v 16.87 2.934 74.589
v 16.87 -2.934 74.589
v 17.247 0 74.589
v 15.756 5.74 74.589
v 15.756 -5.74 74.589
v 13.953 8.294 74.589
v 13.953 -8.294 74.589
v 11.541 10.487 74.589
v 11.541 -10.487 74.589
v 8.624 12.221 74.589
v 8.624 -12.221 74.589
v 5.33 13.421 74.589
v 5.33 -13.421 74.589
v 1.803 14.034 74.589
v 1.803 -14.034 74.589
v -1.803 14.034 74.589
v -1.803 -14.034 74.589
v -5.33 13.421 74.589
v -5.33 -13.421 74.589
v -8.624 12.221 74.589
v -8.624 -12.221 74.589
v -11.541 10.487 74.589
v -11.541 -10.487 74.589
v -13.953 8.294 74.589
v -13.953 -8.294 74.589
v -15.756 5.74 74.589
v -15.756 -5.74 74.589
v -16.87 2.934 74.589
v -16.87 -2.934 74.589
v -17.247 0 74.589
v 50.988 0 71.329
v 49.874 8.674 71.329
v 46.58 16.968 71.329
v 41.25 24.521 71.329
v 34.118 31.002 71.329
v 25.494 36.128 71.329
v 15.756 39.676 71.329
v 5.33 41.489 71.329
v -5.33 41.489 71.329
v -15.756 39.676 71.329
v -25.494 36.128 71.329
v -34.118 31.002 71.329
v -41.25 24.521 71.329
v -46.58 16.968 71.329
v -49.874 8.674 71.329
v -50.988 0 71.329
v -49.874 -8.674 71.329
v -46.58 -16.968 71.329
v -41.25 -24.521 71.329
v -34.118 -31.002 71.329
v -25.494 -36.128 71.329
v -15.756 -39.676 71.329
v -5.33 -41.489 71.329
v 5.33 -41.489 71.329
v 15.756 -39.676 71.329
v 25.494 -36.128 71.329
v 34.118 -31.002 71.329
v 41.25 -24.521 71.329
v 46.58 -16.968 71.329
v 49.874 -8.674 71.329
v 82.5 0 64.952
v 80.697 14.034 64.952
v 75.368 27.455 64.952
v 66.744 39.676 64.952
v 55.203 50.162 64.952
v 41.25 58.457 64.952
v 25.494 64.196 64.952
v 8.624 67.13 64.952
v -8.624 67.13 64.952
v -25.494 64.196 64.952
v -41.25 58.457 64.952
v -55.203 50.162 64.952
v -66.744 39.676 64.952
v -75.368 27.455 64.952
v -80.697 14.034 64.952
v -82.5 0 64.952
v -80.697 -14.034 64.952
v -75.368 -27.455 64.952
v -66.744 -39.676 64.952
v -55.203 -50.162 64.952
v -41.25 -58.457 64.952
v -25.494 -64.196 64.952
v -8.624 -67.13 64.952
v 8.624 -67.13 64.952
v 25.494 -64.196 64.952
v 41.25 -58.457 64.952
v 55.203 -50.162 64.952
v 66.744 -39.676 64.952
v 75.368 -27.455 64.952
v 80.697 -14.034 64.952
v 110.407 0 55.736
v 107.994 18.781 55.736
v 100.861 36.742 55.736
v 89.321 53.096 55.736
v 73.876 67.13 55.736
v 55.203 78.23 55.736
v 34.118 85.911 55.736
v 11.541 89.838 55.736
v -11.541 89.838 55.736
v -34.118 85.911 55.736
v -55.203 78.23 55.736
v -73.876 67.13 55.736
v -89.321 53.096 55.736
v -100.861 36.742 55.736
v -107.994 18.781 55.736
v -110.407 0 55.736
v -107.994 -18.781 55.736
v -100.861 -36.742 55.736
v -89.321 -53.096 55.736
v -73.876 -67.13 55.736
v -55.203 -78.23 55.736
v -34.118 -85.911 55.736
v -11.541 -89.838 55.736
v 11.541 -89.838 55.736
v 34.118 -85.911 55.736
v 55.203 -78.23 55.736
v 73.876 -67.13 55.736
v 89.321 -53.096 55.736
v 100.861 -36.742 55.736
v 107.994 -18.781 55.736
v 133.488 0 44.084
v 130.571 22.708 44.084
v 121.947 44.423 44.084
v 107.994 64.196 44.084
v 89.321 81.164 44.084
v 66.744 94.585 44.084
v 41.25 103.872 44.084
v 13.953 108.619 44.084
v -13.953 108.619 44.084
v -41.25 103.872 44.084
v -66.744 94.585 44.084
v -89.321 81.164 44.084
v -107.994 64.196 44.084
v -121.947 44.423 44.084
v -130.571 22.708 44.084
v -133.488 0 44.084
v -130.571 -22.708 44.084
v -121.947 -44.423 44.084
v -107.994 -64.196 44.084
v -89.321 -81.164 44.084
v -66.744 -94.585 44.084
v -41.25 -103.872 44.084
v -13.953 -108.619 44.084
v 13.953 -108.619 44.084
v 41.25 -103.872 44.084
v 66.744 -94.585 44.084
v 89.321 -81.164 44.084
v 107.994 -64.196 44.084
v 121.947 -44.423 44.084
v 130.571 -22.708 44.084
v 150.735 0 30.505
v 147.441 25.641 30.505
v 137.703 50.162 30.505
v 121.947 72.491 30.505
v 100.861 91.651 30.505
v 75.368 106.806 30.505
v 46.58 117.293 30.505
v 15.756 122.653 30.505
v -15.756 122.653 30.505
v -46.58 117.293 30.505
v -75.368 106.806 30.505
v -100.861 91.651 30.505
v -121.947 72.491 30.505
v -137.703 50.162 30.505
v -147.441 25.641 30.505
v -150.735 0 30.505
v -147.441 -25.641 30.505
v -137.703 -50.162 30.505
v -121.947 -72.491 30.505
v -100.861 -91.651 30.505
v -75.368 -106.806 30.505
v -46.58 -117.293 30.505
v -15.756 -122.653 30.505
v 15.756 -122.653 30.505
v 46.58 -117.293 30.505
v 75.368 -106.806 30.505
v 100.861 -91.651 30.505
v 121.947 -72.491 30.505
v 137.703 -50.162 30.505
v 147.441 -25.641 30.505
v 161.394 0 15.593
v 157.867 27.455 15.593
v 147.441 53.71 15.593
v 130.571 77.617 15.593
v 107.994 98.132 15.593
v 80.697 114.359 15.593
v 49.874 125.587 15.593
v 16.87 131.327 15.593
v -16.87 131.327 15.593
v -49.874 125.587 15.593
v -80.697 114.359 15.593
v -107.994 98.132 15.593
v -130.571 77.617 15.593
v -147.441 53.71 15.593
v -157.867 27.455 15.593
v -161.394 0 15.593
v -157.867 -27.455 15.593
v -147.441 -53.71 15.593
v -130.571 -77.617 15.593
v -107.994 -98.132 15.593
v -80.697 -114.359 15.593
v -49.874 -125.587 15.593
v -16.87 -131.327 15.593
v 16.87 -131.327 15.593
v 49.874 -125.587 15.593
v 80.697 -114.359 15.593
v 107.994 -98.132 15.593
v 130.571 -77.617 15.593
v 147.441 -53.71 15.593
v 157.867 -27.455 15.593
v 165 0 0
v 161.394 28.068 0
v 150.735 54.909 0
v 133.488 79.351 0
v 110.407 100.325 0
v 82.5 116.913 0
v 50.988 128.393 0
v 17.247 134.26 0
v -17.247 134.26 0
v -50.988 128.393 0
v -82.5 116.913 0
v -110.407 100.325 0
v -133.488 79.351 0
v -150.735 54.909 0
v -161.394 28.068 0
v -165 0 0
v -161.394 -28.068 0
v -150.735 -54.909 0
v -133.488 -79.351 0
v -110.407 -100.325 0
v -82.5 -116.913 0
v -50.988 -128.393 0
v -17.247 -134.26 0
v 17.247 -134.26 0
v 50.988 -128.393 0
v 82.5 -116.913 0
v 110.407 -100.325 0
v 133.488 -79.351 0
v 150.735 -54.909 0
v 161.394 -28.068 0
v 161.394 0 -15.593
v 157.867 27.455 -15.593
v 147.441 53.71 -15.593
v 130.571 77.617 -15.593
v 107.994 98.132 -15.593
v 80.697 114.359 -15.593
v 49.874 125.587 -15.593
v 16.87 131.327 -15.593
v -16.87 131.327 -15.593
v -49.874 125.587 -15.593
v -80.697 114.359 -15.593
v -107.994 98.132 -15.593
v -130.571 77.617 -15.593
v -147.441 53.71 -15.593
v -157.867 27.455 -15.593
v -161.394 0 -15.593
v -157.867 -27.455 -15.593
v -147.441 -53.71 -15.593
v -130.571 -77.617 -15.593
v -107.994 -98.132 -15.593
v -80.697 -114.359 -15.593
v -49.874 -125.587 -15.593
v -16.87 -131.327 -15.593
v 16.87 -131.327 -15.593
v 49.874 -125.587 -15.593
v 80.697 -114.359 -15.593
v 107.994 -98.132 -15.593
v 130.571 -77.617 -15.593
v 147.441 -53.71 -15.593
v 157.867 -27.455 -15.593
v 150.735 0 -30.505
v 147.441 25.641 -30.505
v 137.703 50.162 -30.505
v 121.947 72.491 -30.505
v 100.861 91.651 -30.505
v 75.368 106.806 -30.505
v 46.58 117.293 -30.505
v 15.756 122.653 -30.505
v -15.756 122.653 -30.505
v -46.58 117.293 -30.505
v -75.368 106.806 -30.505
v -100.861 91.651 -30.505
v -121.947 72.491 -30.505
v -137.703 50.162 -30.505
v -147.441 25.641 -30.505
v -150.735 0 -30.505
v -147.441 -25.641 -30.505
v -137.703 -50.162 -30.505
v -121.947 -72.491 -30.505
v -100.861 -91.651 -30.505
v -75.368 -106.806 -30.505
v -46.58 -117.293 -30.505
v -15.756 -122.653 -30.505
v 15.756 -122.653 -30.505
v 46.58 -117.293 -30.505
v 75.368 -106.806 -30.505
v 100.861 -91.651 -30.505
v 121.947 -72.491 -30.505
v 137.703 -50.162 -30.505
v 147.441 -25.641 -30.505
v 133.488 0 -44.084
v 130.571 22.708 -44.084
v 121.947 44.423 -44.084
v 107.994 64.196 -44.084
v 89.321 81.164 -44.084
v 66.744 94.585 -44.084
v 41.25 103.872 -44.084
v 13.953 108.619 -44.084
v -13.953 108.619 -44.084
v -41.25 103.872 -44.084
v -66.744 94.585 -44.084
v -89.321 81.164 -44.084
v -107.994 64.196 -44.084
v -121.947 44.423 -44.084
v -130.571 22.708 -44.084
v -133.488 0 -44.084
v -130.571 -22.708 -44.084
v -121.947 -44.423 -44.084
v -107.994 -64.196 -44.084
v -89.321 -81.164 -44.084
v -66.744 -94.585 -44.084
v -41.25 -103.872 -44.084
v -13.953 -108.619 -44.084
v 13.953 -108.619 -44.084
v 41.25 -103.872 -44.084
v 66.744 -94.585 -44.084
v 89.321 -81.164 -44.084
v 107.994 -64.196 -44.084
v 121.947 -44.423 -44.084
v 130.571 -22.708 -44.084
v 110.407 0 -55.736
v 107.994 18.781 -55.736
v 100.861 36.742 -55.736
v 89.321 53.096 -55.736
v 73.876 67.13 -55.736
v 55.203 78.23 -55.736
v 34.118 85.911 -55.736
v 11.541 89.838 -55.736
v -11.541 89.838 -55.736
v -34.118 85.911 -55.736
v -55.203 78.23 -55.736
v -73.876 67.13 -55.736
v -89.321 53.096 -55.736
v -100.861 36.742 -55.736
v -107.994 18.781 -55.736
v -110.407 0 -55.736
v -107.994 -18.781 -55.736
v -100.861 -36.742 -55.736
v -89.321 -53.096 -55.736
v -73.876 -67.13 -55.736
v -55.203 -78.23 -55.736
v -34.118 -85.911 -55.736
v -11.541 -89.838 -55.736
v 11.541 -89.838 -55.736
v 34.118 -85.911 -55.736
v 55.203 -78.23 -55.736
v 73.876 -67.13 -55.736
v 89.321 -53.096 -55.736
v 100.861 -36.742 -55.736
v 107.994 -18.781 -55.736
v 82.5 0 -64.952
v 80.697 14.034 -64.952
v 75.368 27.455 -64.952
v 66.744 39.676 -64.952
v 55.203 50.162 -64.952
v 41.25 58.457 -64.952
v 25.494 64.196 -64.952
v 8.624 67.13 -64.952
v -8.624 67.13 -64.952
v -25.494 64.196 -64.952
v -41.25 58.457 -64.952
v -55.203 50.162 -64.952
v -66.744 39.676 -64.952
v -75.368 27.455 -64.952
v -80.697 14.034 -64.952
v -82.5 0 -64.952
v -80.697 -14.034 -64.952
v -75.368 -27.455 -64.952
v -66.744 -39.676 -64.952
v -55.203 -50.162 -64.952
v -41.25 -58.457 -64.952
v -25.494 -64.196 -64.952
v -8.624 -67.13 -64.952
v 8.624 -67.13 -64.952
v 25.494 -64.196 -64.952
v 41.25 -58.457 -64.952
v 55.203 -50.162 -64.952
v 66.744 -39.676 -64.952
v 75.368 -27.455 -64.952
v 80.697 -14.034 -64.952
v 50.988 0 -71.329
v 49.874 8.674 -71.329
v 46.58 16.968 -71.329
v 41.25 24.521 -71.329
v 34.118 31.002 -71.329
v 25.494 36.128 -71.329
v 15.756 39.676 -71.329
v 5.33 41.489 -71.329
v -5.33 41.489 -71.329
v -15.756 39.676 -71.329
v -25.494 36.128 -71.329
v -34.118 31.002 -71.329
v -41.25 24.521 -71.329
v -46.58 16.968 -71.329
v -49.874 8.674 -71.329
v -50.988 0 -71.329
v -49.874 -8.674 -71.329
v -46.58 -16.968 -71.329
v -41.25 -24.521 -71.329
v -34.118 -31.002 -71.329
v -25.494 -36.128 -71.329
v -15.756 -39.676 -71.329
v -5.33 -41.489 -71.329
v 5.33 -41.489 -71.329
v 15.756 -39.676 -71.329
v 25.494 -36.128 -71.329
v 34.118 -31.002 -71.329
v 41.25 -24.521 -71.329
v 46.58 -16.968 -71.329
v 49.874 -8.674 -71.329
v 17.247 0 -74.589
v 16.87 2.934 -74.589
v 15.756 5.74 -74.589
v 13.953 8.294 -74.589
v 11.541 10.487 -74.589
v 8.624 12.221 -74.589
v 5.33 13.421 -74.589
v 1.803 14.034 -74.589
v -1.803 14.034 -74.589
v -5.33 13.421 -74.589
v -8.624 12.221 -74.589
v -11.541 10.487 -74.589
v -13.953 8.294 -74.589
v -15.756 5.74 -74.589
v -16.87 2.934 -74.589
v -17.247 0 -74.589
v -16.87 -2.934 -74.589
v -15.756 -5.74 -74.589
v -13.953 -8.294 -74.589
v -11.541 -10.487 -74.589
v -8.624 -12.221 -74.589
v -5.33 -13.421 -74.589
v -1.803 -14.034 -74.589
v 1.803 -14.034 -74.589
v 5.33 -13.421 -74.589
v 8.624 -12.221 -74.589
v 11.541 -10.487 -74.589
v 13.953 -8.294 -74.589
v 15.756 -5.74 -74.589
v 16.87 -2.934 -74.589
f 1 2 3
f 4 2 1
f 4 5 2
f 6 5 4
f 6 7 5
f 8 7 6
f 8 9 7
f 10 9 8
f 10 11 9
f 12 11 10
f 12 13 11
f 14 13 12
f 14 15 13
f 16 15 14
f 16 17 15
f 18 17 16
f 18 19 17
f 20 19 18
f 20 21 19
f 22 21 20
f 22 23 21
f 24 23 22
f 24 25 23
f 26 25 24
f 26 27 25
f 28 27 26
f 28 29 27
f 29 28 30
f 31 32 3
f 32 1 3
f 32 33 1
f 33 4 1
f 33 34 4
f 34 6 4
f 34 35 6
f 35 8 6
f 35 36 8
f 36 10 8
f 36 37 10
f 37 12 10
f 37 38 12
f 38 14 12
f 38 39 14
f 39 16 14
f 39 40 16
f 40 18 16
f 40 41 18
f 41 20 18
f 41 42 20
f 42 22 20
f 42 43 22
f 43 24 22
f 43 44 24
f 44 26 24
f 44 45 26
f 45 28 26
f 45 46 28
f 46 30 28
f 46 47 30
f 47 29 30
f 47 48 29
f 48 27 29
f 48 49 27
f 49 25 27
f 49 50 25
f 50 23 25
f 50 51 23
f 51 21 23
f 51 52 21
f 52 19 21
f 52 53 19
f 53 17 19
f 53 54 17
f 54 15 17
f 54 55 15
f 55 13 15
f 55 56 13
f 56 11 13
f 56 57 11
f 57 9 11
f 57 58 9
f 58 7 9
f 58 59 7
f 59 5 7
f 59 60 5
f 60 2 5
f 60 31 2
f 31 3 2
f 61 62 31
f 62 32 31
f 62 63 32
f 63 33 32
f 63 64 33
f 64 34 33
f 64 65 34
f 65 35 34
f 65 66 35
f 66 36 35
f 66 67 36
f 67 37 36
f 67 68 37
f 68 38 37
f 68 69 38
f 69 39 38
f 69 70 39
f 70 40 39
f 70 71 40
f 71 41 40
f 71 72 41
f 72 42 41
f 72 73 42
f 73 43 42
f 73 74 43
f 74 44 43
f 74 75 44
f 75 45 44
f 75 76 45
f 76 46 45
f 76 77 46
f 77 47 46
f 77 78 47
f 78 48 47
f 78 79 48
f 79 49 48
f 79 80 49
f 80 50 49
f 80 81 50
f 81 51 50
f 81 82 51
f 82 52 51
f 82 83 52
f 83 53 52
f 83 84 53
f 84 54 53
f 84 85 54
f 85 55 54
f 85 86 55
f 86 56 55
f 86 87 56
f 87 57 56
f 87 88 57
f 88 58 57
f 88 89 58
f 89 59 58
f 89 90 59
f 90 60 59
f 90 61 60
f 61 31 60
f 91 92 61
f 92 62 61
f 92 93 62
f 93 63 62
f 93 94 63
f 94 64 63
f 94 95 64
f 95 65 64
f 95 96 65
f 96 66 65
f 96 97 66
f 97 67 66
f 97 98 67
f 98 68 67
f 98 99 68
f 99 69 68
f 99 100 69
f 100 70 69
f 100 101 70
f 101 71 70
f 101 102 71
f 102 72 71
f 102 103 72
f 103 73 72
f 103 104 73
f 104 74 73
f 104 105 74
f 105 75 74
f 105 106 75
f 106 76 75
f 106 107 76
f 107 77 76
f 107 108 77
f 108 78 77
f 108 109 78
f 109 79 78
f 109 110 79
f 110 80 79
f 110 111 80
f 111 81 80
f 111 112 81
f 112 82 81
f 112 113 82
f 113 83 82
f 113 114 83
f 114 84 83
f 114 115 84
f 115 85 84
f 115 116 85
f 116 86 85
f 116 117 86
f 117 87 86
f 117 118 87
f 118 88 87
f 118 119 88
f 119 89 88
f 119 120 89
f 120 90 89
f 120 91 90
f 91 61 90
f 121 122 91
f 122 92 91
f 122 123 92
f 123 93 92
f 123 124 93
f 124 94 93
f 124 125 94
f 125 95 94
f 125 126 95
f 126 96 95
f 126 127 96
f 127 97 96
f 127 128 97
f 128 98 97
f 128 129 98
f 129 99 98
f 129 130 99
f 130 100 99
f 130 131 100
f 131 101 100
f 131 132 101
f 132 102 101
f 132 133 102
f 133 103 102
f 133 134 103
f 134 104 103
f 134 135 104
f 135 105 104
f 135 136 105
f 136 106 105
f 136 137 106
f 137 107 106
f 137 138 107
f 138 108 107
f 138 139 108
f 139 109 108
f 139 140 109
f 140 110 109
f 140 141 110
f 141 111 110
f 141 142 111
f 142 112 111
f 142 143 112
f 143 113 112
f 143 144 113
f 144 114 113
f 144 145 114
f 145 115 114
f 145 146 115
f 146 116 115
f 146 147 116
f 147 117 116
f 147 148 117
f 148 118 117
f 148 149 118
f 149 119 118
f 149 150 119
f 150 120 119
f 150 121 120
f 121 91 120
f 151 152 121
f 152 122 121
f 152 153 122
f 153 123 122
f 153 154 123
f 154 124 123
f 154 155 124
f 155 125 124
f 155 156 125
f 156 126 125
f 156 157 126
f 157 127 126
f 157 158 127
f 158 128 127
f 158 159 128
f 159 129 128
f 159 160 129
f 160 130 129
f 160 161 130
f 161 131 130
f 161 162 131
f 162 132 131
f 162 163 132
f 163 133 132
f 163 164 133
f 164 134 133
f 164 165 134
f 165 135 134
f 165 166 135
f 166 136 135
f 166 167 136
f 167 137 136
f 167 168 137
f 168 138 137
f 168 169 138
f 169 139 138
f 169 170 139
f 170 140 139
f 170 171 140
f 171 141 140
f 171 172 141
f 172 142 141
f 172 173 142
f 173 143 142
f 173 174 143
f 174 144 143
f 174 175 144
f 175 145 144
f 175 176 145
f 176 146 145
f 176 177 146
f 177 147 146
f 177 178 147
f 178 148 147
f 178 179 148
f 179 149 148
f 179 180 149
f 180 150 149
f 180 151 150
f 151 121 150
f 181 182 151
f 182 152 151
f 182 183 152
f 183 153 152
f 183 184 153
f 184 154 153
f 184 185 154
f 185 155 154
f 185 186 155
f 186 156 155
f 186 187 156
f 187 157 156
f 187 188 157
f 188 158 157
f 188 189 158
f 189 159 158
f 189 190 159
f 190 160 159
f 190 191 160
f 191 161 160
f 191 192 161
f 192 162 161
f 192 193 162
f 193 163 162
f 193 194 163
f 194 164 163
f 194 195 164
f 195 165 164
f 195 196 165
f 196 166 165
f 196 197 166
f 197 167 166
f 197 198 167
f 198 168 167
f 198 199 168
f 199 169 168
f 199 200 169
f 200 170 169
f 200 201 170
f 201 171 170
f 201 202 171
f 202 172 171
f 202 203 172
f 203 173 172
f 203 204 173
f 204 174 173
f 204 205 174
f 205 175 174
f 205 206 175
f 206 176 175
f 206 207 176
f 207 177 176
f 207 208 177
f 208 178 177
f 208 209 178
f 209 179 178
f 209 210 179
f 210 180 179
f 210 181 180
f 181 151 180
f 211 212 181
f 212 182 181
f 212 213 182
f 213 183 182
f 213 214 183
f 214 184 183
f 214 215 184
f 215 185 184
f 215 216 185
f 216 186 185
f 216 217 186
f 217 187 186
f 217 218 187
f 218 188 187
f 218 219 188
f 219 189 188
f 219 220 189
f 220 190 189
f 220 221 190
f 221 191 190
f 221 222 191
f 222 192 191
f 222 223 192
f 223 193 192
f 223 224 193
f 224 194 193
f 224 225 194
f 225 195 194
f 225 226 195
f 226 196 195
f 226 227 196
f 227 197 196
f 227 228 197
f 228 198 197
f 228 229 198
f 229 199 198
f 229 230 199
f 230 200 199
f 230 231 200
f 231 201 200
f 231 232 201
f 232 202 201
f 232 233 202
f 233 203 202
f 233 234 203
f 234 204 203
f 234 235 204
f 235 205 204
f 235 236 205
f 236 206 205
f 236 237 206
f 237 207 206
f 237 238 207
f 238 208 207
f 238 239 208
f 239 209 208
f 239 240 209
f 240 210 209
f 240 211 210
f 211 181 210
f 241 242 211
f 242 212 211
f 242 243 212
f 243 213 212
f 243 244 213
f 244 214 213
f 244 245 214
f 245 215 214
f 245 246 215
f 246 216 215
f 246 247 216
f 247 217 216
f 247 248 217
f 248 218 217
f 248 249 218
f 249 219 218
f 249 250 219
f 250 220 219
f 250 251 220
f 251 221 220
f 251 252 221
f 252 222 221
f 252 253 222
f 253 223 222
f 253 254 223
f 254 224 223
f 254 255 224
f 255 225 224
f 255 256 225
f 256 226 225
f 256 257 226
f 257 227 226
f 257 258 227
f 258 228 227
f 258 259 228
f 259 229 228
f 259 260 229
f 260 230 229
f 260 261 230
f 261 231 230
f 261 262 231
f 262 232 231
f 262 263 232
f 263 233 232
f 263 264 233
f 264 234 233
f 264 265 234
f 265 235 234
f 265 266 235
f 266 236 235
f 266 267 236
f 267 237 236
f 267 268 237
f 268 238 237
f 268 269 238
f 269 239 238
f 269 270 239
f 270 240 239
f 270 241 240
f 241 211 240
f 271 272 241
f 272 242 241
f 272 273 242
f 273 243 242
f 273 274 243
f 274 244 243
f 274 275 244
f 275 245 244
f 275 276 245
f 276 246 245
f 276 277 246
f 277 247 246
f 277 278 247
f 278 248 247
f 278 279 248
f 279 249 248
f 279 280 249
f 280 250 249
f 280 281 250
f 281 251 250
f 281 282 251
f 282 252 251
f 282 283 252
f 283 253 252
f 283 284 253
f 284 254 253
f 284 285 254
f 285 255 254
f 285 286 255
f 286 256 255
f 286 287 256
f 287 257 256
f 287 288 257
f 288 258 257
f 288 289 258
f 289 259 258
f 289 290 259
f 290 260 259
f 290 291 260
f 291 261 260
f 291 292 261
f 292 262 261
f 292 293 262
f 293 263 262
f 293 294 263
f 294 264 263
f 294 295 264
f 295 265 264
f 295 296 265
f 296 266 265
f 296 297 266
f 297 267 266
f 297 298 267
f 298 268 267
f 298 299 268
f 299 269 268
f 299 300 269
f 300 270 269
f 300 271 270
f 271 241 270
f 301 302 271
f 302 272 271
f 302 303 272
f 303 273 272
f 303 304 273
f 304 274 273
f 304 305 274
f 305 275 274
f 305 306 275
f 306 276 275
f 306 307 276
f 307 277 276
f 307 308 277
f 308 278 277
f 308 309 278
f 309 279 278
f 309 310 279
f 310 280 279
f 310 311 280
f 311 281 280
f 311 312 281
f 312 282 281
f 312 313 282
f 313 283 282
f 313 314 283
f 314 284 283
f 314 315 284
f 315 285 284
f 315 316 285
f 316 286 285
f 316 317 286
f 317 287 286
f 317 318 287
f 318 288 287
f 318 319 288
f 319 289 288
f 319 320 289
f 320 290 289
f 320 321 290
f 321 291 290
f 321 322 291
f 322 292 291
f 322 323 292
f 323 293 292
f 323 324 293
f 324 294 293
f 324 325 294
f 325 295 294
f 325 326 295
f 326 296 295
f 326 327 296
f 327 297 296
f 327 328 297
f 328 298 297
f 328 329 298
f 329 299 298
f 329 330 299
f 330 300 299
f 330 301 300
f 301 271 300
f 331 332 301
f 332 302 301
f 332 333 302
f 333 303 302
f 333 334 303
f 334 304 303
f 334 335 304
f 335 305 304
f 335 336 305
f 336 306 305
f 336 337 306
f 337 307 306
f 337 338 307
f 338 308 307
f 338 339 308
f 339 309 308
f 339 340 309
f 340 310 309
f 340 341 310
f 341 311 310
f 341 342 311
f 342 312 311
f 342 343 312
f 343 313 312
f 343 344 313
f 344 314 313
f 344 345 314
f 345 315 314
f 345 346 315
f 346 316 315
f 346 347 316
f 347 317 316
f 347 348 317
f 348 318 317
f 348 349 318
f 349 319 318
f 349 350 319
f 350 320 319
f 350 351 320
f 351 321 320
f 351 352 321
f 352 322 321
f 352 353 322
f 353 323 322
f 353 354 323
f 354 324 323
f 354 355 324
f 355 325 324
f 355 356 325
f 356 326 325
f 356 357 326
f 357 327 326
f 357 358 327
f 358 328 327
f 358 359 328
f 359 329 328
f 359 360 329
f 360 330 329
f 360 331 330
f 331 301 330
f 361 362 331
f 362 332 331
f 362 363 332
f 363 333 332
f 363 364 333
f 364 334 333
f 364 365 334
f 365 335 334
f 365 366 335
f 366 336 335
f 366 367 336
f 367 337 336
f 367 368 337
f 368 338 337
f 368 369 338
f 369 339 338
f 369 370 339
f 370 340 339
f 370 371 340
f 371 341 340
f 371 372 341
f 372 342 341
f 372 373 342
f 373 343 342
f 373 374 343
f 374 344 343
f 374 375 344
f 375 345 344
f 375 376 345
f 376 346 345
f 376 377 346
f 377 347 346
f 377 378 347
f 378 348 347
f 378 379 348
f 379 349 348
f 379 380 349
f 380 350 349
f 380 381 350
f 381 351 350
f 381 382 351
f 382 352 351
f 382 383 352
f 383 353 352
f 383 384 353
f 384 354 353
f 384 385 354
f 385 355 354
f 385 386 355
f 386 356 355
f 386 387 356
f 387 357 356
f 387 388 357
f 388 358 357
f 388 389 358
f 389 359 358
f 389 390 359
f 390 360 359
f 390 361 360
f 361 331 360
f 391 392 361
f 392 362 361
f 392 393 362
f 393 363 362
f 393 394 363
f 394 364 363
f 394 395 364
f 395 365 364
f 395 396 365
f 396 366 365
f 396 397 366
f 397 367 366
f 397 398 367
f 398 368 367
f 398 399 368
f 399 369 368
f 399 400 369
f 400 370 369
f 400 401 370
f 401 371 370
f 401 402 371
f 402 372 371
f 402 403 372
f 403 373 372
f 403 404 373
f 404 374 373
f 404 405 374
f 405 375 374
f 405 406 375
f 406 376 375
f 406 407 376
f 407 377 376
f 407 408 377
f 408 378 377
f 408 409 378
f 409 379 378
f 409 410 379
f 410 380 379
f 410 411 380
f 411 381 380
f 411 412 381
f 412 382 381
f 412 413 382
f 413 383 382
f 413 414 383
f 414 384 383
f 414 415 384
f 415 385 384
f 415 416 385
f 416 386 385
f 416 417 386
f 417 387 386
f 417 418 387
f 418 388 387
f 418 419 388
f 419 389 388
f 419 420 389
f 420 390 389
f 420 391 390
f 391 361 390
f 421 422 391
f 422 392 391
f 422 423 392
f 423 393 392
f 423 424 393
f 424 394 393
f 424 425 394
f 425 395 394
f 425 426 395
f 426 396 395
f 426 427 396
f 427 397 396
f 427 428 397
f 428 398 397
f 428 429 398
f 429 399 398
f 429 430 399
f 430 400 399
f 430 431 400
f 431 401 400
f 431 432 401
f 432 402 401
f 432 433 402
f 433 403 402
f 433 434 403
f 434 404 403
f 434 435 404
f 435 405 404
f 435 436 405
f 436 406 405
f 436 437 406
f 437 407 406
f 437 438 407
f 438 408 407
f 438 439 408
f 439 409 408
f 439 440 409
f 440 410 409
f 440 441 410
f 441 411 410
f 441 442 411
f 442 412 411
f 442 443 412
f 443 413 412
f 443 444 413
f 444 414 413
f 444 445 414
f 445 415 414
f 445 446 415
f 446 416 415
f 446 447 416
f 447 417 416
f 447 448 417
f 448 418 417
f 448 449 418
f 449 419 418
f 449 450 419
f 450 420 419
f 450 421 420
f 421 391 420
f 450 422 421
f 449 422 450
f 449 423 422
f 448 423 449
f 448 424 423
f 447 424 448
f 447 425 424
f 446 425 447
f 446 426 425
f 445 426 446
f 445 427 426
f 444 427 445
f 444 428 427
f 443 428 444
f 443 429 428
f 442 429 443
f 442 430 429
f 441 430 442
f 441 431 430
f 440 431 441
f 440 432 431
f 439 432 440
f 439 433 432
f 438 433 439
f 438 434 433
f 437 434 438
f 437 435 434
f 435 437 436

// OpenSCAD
// Generated by SolidPython 1.0.1 on 2020-07-29 00:46:49


scale(v = [11, 9, 5]) {
	sphere(r = 15);
}
/***********************************************
*********      SolidPython code:      **********
************************************************
 
# import packages: SolidPython
from solid import *
from solid.utils import *
from itertools import chain, combinations, permutations


class Resize:

    def __init__(self, scad_file):
        self.scad_file = scad_file
        #self.scad_file = import_scad(scad_file)
        # cone/cylinder param:
        self.r1 = 0
        self.r2 = 0
        self.h = 0
        # rectangular prism param:
        self.w = 0
        self.l = 0
        # ellipse param:
        self.r = 0

    # import OpenScad code (file name corresponds to shape)


    # classify shape + parameters
    def assign(self, param1, param2, param3):
        if self.scad_file == 'cone.scad':
            self.r1 = param1
            self.r2 = param2
            self.h = param3
        elif self.scad_file == 'cylinder.scad':
            self.r1 = param1
            self.r2 = param2
            self.h = param3
        elif self.scad_file == 'rectangularPrism.scad':
            self.h = param1
            self.l = param2
            self.w = param3
        else:
            self.r = param1
            self.h = param2

    # resize parameters
    def iterate(self):
        x = range(3, 20, 2)
        i = 1
        if self.scad_file == 'cone.scad':
            tempList = list(permutations(x, 2))
            for temp in tempList:
                param1 = temp[0]
                param2 = temp[1]
                filepath = 'produced_scad_files/' + 'cone' + str(param1) + '_' + str(param2) + '_' + '.scad'
                scad_render_to_file(cylinder(h=param1, r1=param2, r2=0), filepath)

        elif self.scad_file == 'cylinder.scad':
            tempList = list(permutations(x, 3))
            for temp in tempList:
                param1 = temp[0]
                param2 = temp[1]
                filepath = 'produced_scad_files/' + 'cylinder' + str(param1) + '_' + str(param2) + '_' + '.scad'
                scad_render_to_file(cylinder(h=param1, r1=param2, r2=param2), filepath)

        elif self.scad_file == 'rectangularPrism.scad':
            tempList = list(permutations(x, 3))
            for temp in tempList:
                param1 = temp[0]
                param2 = temp[1]
                param3 = temp[2]
                filepath = 'produced_scad_files/' + 'rectangularPrism' + str(param1) + '_' + str(param2) + '_' + str(
                    param3) + '.scad'
                scad_render_to_file(cube(size=(param1, param2, param3)), filepath)

        elif self.scad_file == 'ellipse.scad':
            tempList = list(permutations(x, 4))
            for temp in tempList:
                param1 = temp[0]
                param2 = temp[1]
                param3 = temp[2]
                param4 = temp[3]
                filepath = 'produced_scad_files/' + 'ellipse' + str(param1) + '_' + str(param2) + '_' + str(param3) + '_' + str(param4) + '.scad'
                scad_render_to_file(scale([param1, param2, param3])(sphere(r=param4)), filepath)

    def render_to_scadfile(self):
        scad_render_to_file(scad, 'example.scad') 
 
************************************************/
